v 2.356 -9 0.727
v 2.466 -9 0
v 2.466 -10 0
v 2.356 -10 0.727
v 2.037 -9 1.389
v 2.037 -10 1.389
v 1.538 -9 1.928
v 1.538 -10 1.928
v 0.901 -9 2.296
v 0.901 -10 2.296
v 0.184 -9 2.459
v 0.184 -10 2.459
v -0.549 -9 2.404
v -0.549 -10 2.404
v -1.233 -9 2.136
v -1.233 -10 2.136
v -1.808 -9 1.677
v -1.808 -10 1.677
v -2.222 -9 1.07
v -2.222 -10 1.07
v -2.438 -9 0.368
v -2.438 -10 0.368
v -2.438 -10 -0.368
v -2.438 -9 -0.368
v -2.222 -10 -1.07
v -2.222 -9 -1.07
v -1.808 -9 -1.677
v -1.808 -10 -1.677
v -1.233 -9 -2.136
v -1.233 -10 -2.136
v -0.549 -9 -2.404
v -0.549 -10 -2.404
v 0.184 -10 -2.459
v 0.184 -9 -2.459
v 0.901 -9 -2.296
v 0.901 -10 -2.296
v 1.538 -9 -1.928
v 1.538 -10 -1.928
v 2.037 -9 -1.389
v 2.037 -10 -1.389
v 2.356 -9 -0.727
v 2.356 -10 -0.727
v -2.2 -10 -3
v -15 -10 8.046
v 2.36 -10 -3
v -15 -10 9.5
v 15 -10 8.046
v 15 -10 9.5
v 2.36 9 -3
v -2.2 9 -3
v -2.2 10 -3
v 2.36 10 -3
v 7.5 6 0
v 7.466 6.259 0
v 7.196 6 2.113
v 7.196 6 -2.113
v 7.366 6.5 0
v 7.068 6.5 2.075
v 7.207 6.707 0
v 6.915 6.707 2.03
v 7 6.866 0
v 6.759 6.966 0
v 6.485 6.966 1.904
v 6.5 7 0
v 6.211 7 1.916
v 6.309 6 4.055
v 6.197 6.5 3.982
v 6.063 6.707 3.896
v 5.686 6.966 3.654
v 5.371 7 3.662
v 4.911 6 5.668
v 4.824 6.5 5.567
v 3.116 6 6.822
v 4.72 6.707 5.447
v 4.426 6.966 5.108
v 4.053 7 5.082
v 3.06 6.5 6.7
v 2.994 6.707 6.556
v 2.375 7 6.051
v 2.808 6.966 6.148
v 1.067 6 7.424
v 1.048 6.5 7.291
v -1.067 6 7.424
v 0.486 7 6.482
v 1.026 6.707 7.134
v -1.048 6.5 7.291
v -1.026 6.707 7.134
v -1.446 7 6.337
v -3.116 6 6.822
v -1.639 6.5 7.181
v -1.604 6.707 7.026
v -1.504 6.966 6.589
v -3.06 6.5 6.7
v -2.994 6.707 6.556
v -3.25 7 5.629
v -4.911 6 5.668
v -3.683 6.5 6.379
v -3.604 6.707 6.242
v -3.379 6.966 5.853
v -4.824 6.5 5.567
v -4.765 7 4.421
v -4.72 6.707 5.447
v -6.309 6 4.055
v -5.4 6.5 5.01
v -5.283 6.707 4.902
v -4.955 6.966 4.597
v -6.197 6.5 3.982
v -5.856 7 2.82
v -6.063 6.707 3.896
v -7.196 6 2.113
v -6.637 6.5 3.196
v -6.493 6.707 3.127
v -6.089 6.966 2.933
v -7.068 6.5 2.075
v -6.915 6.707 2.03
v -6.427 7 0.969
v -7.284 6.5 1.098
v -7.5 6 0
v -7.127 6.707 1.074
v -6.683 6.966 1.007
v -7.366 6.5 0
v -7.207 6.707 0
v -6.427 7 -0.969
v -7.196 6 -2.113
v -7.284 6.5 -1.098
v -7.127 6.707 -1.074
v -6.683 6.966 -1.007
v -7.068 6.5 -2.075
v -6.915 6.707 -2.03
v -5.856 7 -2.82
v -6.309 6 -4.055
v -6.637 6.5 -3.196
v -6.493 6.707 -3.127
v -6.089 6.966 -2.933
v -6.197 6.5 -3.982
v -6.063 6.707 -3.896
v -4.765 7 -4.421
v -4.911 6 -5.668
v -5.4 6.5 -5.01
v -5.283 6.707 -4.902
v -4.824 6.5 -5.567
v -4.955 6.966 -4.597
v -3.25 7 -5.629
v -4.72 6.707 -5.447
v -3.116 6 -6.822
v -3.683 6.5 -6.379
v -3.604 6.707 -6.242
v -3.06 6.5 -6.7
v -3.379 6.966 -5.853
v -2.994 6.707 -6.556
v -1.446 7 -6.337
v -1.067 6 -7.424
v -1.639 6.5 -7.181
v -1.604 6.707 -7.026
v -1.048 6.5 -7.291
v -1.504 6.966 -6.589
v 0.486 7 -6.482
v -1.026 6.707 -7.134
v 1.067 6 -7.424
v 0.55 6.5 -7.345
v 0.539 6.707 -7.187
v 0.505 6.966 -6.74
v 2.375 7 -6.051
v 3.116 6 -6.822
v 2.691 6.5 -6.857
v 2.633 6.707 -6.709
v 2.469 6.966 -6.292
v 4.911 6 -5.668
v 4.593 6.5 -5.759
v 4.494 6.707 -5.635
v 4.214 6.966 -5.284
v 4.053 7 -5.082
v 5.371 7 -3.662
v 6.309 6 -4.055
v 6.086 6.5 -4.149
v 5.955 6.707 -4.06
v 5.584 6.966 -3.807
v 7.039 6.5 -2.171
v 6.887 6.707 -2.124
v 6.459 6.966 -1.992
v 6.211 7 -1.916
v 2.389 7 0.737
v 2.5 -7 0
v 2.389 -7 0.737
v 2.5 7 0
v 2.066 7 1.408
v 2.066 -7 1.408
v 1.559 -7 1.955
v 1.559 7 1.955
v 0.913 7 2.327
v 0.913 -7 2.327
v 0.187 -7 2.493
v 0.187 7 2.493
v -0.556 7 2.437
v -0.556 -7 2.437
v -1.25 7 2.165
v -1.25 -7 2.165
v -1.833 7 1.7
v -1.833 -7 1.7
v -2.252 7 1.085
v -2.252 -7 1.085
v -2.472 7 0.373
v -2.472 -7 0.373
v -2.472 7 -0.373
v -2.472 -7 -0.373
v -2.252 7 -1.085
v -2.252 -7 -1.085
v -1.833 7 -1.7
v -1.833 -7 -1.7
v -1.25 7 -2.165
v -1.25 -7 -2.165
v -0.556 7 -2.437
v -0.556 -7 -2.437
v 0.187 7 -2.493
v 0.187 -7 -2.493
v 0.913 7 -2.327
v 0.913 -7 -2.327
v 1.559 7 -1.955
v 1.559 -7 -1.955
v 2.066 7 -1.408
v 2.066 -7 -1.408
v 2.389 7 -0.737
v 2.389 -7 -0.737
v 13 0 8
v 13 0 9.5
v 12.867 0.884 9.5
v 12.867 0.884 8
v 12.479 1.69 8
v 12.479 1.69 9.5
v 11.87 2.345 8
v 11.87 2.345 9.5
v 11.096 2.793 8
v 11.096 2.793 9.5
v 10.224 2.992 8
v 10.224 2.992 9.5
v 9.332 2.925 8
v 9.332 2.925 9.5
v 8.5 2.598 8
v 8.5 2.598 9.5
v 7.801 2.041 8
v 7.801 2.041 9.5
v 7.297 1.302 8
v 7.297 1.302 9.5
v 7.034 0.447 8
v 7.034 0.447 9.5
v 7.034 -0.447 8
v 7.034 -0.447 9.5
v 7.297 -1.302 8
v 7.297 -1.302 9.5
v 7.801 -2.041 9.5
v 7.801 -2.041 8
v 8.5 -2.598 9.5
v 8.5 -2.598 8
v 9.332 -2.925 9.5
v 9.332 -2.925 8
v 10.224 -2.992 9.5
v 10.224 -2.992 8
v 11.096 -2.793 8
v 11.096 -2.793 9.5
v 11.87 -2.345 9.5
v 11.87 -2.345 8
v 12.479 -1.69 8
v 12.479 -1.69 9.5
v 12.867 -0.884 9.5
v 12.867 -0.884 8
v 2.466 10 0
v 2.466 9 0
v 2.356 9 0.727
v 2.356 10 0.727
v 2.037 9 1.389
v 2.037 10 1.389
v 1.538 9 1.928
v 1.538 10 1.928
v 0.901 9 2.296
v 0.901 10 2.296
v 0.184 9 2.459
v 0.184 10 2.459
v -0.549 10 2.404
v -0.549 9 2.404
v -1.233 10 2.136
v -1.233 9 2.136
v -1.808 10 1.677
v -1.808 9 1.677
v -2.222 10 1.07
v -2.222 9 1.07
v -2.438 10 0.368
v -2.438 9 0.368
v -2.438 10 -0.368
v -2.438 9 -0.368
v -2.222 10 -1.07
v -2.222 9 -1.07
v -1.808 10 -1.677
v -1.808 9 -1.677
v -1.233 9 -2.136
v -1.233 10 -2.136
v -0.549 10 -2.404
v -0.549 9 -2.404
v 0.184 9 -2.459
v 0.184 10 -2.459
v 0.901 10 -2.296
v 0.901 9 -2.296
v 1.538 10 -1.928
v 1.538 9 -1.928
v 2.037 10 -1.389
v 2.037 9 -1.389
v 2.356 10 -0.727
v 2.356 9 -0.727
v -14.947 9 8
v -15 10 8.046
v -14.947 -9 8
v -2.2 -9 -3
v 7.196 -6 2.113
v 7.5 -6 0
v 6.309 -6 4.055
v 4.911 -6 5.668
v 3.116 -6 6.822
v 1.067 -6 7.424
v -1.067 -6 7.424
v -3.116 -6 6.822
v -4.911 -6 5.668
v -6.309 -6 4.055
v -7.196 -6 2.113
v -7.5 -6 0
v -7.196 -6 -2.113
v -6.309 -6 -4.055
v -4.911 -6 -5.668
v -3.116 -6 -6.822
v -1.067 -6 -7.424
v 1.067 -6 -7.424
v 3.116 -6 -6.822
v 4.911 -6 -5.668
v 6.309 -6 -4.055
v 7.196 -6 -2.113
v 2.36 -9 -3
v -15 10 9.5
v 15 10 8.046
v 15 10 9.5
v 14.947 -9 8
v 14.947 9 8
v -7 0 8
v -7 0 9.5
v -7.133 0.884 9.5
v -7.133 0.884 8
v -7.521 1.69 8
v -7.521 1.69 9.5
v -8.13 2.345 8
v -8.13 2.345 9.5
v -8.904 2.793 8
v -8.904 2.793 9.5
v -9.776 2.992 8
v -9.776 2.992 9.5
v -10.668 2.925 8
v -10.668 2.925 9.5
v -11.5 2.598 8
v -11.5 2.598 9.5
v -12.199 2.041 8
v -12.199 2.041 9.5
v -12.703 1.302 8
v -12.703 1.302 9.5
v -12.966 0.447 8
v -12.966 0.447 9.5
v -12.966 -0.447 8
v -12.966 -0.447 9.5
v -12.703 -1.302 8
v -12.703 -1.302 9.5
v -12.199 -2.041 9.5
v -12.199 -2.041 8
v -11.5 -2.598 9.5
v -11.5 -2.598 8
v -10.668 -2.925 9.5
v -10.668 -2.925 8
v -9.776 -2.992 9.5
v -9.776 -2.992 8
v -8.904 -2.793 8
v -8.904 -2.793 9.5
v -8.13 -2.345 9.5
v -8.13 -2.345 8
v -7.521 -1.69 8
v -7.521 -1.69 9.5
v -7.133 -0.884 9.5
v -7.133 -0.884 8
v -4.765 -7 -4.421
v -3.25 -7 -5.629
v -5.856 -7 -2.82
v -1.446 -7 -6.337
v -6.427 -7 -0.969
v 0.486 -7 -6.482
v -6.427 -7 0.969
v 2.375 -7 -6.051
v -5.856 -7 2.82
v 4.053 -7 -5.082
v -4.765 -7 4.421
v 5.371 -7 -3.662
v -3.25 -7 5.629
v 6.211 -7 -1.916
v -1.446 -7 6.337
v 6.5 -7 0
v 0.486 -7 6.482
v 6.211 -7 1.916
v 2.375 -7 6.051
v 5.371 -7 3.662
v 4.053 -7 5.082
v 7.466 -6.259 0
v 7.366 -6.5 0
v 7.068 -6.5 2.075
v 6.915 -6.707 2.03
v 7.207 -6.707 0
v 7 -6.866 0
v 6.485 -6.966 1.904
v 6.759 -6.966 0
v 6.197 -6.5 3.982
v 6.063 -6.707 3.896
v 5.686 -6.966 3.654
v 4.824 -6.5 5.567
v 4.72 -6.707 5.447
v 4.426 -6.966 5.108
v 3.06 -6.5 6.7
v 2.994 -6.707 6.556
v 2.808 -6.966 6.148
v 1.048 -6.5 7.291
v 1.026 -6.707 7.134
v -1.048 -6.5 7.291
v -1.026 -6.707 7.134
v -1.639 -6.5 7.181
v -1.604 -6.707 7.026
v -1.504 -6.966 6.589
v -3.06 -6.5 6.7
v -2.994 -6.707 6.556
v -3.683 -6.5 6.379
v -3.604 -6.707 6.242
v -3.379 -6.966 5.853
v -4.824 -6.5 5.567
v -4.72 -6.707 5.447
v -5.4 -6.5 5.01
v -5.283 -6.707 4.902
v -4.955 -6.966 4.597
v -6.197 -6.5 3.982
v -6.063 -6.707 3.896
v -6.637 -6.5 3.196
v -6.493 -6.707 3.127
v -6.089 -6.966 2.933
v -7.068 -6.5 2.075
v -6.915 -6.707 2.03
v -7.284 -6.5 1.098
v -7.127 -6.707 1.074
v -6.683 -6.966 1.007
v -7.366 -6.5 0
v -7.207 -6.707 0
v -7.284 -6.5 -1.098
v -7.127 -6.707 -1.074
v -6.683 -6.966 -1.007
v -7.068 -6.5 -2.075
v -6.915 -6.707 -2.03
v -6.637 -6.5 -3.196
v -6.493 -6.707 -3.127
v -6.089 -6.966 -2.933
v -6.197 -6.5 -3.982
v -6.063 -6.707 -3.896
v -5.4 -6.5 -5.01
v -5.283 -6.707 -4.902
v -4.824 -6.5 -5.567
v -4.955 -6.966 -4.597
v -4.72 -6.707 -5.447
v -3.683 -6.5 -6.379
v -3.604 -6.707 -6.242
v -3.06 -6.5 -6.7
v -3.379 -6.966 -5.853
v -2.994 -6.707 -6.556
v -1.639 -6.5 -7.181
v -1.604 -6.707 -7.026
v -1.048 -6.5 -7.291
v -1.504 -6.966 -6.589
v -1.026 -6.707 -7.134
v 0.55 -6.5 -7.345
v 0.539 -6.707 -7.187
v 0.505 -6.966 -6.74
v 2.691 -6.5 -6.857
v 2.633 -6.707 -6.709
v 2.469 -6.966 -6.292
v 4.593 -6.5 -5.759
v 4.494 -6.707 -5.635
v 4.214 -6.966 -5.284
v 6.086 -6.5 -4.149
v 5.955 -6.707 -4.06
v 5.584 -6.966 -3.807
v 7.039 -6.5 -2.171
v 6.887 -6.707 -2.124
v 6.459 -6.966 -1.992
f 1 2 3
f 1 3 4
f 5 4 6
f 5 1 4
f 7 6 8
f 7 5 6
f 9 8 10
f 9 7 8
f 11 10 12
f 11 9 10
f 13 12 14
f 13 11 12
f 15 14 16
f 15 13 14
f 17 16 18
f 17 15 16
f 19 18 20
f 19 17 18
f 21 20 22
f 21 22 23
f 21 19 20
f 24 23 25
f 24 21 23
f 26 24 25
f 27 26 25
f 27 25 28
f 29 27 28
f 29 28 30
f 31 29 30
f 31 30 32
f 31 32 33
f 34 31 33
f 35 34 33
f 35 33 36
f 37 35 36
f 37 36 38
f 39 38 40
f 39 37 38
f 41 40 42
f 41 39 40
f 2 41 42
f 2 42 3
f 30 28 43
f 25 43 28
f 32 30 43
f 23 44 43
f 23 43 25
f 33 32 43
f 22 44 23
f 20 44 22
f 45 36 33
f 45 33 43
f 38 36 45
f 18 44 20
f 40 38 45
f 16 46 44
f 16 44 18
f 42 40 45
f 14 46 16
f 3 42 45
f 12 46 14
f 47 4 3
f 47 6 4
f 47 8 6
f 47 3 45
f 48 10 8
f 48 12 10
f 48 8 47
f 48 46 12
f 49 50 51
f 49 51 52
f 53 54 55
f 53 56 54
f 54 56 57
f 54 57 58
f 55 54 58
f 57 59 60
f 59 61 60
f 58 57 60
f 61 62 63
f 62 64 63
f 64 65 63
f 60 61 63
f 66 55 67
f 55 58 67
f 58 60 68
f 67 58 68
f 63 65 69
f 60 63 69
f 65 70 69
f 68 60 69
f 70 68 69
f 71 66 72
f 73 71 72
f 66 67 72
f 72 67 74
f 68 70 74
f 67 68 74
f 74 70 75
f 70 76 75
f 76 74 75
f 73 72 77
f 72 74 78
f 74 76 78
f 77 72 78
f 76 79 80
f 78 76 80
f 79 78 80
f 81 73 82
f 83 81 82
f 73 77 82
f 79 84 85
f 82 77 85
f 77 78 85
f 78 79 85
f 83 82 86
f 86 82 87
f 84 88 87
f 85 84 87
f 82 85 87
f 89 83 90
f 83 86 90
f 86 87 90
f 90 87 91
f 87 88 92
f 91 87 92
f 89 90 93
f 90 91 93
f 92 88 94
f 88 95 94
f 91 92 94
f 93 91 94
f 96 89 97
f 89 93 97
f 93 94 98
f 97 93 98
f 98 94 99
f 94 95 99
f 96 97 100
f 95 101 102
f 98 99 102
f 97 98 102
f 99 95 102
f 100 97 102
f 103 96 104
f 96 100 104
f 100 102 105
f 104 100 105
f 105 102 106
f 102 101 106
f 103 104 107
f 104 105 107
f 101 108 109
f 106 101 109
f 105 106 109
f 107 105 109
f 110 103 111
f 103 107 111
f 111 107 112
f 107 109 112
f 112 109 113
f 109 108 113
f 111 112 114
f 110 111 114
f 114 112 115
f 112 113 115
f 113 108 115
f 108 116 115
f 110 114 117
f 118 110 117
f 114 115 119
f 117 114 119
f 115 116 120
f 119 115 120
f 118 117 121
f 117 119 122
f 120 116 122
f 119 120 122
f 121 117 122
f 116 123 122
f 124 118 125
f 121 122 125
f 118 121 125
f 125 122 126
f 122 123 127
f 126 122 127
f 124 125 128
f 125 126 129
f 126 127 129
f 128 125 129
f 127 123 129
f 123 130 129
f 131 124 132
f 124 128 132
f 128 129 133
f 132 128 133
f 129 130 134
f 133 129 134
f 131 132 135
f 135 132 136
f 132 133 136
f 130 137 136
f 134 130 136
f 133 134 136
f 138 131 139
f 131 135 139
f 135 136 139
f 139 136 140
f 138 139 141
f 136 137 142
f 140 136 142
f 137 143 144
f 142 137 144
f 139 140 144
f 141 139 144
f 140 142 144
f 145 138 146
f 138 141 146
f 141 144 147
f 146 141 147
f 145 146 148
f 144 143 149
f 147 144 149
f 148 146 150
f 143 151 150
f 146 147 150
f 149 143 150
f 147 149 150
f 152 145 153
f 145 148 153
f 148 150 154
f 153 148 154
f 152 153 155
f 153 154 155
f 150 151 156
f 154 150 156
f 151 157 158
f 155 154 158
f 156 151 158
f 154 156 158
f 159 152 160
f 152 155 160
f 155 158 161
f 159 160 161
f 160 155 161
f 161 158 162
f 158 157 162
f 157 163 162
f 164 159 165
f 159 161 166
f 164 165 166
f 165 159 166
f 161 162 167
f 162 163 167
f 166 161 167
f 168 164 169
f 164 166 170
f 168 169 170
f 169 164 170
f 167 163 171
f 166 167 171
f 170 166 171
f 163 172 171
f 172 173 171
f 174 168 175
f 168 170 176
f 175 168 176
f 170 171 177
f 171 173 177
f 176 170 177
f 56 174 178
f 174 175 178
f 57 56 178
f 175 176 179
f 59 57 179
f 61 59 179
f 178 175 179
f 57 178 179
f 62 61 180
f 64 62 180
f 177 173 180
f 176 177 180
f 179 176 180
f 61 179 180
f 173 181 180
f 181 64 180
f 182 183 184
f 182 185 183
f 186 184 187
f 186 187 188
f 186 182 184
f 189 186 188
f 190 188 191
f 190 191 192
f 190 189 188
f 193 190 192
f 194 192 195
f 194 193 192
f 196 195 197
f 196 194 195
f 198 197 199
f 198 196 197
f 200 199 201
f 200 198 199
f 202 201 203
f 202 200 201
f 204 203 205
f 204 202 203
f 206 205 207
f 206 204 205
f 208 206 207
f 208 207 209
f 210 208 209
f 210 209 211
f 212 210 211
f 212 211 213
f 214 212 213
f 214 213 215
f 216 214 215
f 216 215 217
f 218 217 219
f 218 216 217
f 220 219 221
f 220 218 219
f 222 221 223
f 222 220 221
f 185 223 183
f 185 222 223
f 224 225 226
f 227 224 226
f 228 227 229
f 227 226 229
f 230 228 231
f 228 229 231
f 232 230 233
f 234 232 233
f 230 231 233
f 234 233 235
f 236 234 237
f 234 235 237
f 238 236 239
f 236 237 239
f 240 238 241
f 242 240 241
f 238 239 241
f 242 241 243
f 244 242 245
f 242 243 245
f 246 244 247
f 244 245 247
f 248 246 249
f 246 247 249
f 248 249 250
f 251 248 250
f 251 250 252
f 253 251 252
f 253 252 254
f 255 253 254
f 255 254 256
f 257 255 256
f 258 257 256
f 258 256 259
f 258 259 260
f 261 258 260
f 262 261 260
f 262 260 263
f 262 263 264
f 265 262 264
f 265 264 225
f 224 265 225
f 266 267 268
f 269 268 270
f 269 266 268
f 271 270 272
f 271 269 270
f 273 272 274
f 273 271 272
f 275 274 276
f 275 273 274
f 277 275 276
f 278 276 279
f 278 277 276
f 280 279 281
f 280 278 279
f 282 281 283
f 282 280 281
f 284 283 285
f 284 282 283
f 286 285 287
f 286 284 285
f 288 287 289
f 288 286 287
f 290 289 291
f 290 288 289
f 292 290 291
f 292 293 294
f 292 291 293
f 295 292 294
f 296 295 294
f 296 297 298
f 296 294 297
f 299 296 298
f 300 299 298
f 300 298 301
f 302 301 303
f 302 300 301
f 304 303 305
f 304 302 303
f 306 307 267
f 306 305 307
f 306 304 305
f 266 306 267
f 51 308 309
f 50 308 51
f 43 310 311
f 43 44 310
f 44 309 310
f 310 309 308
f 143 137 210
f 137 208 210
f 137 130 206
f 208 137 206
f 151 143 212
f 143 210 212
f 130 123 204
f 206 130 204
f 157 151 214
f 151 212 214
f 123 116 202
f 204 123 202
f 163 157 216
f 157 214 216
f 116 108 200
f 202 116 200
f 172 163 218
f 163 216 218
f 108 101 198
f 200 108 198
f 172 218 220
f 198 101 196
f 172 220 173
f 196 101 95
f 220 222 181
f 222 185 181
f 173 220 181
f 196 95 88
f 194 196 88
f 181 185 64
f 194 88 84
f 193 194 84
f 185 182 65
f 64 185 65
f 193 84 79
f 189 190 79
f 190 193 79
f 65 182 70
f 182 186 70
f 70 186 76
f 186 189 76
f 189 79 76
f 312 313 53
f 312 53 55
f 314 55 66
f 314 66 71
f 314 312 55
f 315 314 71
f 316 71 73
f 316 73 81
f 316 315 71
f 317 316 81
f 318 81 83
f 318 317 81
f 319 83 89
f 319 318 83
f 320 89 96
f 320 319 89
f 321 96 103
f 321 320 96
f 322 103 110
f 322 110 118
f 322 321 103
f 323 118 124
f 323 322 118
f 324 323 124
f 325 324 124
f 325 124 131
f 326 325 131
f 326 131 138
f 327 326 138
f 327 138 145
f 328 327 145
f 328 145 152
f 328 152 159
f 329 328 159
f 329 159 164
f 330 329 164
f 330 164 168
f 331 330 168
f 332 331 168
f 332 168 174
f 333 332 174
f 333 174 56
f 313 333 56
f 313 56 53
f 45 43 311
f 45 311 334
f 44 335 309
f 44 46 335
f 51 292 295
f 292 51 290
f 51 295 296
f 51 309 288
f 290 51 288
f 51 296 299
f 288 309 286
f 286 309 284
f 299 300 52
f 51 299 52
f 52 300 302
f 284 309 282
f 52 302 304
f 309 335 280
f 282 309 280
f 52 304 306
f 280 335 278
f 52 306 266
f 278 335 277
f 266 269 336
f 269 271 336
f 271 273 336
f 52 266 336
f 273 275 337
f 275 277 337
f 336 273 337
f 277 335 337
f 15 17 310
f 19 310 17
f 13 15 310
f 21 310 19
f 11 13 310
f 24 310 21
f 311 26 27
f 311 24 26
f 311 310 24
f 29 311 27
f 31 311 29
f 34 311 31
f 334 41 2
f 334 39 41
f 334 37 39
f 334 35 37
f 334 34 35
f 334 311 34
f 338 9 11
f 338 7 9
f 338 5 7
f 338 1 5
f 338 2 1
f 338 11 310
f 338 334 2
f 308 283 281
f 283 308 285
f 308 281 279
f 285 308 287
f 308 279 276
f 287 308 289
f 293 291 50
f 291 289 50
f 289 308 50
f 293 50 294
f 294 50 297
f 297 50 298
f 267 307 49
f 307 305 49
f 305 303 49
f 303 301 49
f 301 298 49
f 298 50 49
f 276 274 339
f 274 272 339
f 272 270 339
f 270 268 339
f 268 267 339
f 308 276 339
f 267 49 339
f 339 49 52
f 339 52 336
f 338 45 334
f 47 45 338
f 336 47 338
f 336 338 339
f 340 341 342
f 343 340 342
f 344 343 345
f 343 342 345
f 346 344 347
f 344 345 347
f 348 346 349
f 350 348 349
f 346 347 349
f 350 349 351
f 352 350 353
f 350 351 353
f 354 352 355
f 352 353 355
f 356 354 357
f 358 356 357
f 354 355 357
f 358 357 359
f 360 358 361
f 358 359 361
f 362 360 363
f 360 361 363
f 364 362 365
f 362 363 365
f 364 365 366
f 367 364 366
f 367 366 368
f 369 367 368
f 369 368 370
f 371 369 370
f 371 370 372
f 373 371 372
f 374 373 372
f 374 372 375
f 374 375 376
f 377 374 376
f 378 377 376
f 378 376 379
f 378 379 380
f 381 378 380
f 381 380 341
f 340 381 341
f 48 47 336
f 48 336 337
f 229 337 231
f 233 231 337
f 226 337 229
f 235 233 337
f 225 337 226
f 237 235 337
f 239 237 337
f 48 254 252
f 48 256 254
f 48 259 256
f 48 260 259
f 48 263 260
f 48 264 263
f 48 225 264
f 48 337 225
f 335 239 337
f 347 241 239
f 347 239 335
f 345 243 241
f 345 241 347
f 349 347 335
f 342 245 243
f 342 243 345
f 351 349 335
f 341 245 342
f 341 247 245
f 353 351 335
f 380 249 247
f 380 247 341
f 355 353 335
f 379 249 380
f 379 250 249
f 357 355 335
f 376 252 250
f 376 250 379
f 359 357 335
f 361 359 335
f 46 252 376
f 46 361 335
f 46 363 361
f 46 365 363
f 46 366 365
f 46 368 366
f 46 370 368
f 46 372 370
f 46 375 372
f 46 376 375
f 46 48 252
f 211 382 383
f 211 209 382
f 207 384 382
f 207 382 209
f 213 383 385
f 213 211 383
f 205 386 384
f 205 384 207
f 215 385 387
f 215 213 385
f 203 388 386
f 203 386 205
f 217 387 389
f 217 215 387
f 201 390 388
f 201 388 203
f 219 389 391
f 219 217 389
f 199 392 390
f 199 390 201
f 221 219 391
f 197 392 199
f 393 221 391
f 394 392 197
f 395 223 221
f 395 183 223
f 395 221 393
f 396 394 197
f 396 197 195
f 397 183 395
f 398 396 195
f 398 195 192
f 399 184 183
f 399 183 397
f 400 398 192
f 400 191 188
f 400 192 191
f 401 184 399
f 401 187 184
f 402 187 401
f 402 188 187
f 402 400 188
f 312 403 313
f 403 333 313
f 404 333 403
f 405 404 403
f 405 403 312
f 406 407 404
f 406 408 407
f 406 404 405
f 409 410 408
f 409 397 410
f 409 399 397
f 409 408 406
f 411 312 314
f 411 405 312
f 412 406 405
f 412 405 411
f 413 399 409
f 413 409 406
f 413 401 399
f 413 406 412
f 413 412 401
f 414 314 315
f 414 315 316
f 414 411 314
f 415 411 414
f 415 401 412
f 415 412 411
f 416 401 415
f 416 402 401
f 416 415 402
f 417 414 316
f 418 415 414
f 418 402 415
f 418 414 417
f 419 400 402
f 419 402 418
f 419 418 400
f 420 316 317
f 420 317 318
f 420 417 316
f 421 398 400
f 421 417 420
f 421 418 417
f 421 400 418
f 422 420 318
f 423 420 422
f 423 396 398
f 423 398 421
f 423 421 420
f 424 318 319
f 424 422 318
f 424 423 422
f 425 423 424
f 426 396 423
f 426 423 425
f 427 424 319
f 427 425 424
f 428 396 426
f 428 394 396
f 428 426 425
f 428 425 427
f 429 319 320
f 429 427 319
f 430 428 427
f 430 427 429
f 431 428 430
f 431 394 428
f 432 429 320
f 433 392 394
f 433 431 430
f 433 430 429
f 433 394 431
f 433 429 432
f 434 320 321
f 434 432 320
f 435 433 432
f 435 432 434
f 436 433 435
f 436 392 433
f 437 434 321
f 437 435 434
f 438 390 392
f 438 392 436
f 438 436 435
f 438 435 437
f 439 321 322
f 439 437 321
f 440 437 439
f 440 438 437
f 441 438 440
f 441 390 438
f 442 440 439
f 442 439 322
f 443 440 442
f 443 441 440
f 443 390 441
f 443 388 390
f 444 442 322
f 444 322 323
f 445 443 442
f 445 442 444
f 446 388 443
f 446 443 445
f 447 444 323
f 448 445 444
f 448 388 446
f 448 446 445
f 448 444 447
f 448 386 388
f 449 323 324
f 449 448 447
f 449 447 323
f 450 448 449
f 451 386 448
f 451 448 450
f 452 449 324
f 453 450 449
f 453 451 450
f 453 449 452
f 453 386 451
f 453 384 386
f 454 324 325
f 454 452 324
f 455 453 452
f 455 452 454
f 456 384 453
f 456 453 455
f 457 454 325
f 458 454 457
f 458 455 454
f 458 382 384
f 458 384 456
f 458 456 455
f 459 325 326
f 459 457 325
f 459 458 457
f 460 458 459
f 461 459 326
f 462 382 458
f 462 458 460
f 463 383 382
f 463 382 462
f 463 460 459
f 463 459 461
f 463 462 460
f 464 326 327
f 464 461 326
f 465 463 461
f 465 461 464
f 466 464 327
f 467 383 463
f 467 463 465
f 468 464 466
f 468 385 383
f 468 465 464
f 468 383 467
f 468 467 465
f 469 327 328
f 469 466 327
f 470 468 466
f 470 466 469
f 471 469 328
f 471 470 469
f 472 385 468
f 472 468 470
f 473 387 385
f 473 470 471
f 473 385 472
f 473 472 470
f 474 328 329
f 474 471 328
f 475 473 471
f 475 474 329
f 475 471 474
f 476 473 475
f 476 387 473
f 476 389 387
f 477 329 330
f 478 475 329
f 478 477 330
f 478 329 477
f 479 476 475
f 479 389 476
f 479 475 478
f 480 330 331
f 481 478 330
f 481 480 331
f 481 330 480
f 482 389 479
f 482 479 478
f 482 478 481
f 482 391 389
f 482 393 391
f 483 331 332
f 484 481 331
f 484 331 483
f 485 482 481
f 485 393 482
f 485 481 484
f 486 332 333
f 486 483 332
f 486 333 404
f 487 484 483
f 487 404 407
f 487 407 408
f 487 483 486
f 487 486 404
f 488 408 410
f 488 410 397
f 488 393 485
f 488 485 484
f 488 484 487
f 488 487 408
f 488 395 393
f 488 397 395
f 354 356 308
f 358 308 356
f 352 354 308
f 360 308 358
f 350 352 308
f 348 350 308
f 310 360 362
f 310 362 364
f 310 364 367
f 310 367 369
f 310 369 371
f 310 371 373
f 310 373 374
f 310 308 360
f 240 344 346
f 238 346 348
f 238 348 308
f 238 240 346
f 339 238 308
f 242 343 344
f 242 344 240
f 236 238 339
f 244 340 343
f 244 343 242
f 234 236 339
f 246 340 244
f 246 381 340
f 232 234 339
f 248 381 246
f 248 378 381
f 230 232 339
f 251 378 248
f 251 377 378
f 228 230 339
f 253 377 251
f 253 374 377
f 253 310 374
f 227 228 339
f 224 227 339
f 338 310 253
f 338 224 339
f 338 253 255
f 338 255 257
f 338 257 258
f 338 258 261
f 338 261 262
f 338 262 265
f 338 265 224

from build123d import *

# Parameters (mm, degrees)
F0_R     = 7.5
F0_R_2   = 2.5
F1_DEPTH = 7
F2_R     = 1
F3_R     = 2.4659641978
F4_DEPTH = 10
F5_W     = 32.3933225603
F5_H     = 18
F6_DEPTH = 11
F7_R     = 3
F8_DEPTH = 2


with BuildPart() as f1:
    # F0 (on Front) → F1 (new body, symmetric)
    with BuildSketch(Plane.XZ):
        Circle(F0_R)
        Circle(F0_R_2, mode=Mode.SUBTRACT)
    extrude(amount=F1_DEPTH, both=True)

    # F2
    f2_edges = [f1.edges().sort_by_distance(p)[0] for p in [
        (-7.5, -7, 0),
        (-7.5, 7, 0),
    ]]
    fillet(f2_edges, radius=F2_R)


with BuildPart() as f4:
    # F3 (on Front) → F4 (new body, symmetric)
    with BuildSketch(Plane.XZ):
        Polygon((-2.2, -3), (2.3600001695, -3), (15, 8.0461148574), (15, 9.5), (-15, 9.5), (-15, 8.0461148574), align=None)
        Circle(F3_R, mode=Mode.SUBTRACT)
    extrude(amount=F4_DEPTH, both=True)

    # F5 (on face) → F6 (cut)
    with BuildSketch(Plane(origin=(0, 0, -3), x_dir=(1, 0, 0), z_dir=(0, 0, -1))):
        Rectangle(F5_W, F5_H)
    extrude(amount=-F6_DEPTH, mode=Mode.SUBTRACT)

    # F7 (on face) → F8 (cut)
    with BuildSketch(Plane.XY.offset(9.5)):
        with Locations((-10, 0)):
            Circle(F7_R)
        with Locations((10, 0)):
            Circle(F7_R)
    extrude(amount=-F8_DEPTH, mode=Mode.SUBTRACT)


solid = Compound([f1.part, f4.part])
